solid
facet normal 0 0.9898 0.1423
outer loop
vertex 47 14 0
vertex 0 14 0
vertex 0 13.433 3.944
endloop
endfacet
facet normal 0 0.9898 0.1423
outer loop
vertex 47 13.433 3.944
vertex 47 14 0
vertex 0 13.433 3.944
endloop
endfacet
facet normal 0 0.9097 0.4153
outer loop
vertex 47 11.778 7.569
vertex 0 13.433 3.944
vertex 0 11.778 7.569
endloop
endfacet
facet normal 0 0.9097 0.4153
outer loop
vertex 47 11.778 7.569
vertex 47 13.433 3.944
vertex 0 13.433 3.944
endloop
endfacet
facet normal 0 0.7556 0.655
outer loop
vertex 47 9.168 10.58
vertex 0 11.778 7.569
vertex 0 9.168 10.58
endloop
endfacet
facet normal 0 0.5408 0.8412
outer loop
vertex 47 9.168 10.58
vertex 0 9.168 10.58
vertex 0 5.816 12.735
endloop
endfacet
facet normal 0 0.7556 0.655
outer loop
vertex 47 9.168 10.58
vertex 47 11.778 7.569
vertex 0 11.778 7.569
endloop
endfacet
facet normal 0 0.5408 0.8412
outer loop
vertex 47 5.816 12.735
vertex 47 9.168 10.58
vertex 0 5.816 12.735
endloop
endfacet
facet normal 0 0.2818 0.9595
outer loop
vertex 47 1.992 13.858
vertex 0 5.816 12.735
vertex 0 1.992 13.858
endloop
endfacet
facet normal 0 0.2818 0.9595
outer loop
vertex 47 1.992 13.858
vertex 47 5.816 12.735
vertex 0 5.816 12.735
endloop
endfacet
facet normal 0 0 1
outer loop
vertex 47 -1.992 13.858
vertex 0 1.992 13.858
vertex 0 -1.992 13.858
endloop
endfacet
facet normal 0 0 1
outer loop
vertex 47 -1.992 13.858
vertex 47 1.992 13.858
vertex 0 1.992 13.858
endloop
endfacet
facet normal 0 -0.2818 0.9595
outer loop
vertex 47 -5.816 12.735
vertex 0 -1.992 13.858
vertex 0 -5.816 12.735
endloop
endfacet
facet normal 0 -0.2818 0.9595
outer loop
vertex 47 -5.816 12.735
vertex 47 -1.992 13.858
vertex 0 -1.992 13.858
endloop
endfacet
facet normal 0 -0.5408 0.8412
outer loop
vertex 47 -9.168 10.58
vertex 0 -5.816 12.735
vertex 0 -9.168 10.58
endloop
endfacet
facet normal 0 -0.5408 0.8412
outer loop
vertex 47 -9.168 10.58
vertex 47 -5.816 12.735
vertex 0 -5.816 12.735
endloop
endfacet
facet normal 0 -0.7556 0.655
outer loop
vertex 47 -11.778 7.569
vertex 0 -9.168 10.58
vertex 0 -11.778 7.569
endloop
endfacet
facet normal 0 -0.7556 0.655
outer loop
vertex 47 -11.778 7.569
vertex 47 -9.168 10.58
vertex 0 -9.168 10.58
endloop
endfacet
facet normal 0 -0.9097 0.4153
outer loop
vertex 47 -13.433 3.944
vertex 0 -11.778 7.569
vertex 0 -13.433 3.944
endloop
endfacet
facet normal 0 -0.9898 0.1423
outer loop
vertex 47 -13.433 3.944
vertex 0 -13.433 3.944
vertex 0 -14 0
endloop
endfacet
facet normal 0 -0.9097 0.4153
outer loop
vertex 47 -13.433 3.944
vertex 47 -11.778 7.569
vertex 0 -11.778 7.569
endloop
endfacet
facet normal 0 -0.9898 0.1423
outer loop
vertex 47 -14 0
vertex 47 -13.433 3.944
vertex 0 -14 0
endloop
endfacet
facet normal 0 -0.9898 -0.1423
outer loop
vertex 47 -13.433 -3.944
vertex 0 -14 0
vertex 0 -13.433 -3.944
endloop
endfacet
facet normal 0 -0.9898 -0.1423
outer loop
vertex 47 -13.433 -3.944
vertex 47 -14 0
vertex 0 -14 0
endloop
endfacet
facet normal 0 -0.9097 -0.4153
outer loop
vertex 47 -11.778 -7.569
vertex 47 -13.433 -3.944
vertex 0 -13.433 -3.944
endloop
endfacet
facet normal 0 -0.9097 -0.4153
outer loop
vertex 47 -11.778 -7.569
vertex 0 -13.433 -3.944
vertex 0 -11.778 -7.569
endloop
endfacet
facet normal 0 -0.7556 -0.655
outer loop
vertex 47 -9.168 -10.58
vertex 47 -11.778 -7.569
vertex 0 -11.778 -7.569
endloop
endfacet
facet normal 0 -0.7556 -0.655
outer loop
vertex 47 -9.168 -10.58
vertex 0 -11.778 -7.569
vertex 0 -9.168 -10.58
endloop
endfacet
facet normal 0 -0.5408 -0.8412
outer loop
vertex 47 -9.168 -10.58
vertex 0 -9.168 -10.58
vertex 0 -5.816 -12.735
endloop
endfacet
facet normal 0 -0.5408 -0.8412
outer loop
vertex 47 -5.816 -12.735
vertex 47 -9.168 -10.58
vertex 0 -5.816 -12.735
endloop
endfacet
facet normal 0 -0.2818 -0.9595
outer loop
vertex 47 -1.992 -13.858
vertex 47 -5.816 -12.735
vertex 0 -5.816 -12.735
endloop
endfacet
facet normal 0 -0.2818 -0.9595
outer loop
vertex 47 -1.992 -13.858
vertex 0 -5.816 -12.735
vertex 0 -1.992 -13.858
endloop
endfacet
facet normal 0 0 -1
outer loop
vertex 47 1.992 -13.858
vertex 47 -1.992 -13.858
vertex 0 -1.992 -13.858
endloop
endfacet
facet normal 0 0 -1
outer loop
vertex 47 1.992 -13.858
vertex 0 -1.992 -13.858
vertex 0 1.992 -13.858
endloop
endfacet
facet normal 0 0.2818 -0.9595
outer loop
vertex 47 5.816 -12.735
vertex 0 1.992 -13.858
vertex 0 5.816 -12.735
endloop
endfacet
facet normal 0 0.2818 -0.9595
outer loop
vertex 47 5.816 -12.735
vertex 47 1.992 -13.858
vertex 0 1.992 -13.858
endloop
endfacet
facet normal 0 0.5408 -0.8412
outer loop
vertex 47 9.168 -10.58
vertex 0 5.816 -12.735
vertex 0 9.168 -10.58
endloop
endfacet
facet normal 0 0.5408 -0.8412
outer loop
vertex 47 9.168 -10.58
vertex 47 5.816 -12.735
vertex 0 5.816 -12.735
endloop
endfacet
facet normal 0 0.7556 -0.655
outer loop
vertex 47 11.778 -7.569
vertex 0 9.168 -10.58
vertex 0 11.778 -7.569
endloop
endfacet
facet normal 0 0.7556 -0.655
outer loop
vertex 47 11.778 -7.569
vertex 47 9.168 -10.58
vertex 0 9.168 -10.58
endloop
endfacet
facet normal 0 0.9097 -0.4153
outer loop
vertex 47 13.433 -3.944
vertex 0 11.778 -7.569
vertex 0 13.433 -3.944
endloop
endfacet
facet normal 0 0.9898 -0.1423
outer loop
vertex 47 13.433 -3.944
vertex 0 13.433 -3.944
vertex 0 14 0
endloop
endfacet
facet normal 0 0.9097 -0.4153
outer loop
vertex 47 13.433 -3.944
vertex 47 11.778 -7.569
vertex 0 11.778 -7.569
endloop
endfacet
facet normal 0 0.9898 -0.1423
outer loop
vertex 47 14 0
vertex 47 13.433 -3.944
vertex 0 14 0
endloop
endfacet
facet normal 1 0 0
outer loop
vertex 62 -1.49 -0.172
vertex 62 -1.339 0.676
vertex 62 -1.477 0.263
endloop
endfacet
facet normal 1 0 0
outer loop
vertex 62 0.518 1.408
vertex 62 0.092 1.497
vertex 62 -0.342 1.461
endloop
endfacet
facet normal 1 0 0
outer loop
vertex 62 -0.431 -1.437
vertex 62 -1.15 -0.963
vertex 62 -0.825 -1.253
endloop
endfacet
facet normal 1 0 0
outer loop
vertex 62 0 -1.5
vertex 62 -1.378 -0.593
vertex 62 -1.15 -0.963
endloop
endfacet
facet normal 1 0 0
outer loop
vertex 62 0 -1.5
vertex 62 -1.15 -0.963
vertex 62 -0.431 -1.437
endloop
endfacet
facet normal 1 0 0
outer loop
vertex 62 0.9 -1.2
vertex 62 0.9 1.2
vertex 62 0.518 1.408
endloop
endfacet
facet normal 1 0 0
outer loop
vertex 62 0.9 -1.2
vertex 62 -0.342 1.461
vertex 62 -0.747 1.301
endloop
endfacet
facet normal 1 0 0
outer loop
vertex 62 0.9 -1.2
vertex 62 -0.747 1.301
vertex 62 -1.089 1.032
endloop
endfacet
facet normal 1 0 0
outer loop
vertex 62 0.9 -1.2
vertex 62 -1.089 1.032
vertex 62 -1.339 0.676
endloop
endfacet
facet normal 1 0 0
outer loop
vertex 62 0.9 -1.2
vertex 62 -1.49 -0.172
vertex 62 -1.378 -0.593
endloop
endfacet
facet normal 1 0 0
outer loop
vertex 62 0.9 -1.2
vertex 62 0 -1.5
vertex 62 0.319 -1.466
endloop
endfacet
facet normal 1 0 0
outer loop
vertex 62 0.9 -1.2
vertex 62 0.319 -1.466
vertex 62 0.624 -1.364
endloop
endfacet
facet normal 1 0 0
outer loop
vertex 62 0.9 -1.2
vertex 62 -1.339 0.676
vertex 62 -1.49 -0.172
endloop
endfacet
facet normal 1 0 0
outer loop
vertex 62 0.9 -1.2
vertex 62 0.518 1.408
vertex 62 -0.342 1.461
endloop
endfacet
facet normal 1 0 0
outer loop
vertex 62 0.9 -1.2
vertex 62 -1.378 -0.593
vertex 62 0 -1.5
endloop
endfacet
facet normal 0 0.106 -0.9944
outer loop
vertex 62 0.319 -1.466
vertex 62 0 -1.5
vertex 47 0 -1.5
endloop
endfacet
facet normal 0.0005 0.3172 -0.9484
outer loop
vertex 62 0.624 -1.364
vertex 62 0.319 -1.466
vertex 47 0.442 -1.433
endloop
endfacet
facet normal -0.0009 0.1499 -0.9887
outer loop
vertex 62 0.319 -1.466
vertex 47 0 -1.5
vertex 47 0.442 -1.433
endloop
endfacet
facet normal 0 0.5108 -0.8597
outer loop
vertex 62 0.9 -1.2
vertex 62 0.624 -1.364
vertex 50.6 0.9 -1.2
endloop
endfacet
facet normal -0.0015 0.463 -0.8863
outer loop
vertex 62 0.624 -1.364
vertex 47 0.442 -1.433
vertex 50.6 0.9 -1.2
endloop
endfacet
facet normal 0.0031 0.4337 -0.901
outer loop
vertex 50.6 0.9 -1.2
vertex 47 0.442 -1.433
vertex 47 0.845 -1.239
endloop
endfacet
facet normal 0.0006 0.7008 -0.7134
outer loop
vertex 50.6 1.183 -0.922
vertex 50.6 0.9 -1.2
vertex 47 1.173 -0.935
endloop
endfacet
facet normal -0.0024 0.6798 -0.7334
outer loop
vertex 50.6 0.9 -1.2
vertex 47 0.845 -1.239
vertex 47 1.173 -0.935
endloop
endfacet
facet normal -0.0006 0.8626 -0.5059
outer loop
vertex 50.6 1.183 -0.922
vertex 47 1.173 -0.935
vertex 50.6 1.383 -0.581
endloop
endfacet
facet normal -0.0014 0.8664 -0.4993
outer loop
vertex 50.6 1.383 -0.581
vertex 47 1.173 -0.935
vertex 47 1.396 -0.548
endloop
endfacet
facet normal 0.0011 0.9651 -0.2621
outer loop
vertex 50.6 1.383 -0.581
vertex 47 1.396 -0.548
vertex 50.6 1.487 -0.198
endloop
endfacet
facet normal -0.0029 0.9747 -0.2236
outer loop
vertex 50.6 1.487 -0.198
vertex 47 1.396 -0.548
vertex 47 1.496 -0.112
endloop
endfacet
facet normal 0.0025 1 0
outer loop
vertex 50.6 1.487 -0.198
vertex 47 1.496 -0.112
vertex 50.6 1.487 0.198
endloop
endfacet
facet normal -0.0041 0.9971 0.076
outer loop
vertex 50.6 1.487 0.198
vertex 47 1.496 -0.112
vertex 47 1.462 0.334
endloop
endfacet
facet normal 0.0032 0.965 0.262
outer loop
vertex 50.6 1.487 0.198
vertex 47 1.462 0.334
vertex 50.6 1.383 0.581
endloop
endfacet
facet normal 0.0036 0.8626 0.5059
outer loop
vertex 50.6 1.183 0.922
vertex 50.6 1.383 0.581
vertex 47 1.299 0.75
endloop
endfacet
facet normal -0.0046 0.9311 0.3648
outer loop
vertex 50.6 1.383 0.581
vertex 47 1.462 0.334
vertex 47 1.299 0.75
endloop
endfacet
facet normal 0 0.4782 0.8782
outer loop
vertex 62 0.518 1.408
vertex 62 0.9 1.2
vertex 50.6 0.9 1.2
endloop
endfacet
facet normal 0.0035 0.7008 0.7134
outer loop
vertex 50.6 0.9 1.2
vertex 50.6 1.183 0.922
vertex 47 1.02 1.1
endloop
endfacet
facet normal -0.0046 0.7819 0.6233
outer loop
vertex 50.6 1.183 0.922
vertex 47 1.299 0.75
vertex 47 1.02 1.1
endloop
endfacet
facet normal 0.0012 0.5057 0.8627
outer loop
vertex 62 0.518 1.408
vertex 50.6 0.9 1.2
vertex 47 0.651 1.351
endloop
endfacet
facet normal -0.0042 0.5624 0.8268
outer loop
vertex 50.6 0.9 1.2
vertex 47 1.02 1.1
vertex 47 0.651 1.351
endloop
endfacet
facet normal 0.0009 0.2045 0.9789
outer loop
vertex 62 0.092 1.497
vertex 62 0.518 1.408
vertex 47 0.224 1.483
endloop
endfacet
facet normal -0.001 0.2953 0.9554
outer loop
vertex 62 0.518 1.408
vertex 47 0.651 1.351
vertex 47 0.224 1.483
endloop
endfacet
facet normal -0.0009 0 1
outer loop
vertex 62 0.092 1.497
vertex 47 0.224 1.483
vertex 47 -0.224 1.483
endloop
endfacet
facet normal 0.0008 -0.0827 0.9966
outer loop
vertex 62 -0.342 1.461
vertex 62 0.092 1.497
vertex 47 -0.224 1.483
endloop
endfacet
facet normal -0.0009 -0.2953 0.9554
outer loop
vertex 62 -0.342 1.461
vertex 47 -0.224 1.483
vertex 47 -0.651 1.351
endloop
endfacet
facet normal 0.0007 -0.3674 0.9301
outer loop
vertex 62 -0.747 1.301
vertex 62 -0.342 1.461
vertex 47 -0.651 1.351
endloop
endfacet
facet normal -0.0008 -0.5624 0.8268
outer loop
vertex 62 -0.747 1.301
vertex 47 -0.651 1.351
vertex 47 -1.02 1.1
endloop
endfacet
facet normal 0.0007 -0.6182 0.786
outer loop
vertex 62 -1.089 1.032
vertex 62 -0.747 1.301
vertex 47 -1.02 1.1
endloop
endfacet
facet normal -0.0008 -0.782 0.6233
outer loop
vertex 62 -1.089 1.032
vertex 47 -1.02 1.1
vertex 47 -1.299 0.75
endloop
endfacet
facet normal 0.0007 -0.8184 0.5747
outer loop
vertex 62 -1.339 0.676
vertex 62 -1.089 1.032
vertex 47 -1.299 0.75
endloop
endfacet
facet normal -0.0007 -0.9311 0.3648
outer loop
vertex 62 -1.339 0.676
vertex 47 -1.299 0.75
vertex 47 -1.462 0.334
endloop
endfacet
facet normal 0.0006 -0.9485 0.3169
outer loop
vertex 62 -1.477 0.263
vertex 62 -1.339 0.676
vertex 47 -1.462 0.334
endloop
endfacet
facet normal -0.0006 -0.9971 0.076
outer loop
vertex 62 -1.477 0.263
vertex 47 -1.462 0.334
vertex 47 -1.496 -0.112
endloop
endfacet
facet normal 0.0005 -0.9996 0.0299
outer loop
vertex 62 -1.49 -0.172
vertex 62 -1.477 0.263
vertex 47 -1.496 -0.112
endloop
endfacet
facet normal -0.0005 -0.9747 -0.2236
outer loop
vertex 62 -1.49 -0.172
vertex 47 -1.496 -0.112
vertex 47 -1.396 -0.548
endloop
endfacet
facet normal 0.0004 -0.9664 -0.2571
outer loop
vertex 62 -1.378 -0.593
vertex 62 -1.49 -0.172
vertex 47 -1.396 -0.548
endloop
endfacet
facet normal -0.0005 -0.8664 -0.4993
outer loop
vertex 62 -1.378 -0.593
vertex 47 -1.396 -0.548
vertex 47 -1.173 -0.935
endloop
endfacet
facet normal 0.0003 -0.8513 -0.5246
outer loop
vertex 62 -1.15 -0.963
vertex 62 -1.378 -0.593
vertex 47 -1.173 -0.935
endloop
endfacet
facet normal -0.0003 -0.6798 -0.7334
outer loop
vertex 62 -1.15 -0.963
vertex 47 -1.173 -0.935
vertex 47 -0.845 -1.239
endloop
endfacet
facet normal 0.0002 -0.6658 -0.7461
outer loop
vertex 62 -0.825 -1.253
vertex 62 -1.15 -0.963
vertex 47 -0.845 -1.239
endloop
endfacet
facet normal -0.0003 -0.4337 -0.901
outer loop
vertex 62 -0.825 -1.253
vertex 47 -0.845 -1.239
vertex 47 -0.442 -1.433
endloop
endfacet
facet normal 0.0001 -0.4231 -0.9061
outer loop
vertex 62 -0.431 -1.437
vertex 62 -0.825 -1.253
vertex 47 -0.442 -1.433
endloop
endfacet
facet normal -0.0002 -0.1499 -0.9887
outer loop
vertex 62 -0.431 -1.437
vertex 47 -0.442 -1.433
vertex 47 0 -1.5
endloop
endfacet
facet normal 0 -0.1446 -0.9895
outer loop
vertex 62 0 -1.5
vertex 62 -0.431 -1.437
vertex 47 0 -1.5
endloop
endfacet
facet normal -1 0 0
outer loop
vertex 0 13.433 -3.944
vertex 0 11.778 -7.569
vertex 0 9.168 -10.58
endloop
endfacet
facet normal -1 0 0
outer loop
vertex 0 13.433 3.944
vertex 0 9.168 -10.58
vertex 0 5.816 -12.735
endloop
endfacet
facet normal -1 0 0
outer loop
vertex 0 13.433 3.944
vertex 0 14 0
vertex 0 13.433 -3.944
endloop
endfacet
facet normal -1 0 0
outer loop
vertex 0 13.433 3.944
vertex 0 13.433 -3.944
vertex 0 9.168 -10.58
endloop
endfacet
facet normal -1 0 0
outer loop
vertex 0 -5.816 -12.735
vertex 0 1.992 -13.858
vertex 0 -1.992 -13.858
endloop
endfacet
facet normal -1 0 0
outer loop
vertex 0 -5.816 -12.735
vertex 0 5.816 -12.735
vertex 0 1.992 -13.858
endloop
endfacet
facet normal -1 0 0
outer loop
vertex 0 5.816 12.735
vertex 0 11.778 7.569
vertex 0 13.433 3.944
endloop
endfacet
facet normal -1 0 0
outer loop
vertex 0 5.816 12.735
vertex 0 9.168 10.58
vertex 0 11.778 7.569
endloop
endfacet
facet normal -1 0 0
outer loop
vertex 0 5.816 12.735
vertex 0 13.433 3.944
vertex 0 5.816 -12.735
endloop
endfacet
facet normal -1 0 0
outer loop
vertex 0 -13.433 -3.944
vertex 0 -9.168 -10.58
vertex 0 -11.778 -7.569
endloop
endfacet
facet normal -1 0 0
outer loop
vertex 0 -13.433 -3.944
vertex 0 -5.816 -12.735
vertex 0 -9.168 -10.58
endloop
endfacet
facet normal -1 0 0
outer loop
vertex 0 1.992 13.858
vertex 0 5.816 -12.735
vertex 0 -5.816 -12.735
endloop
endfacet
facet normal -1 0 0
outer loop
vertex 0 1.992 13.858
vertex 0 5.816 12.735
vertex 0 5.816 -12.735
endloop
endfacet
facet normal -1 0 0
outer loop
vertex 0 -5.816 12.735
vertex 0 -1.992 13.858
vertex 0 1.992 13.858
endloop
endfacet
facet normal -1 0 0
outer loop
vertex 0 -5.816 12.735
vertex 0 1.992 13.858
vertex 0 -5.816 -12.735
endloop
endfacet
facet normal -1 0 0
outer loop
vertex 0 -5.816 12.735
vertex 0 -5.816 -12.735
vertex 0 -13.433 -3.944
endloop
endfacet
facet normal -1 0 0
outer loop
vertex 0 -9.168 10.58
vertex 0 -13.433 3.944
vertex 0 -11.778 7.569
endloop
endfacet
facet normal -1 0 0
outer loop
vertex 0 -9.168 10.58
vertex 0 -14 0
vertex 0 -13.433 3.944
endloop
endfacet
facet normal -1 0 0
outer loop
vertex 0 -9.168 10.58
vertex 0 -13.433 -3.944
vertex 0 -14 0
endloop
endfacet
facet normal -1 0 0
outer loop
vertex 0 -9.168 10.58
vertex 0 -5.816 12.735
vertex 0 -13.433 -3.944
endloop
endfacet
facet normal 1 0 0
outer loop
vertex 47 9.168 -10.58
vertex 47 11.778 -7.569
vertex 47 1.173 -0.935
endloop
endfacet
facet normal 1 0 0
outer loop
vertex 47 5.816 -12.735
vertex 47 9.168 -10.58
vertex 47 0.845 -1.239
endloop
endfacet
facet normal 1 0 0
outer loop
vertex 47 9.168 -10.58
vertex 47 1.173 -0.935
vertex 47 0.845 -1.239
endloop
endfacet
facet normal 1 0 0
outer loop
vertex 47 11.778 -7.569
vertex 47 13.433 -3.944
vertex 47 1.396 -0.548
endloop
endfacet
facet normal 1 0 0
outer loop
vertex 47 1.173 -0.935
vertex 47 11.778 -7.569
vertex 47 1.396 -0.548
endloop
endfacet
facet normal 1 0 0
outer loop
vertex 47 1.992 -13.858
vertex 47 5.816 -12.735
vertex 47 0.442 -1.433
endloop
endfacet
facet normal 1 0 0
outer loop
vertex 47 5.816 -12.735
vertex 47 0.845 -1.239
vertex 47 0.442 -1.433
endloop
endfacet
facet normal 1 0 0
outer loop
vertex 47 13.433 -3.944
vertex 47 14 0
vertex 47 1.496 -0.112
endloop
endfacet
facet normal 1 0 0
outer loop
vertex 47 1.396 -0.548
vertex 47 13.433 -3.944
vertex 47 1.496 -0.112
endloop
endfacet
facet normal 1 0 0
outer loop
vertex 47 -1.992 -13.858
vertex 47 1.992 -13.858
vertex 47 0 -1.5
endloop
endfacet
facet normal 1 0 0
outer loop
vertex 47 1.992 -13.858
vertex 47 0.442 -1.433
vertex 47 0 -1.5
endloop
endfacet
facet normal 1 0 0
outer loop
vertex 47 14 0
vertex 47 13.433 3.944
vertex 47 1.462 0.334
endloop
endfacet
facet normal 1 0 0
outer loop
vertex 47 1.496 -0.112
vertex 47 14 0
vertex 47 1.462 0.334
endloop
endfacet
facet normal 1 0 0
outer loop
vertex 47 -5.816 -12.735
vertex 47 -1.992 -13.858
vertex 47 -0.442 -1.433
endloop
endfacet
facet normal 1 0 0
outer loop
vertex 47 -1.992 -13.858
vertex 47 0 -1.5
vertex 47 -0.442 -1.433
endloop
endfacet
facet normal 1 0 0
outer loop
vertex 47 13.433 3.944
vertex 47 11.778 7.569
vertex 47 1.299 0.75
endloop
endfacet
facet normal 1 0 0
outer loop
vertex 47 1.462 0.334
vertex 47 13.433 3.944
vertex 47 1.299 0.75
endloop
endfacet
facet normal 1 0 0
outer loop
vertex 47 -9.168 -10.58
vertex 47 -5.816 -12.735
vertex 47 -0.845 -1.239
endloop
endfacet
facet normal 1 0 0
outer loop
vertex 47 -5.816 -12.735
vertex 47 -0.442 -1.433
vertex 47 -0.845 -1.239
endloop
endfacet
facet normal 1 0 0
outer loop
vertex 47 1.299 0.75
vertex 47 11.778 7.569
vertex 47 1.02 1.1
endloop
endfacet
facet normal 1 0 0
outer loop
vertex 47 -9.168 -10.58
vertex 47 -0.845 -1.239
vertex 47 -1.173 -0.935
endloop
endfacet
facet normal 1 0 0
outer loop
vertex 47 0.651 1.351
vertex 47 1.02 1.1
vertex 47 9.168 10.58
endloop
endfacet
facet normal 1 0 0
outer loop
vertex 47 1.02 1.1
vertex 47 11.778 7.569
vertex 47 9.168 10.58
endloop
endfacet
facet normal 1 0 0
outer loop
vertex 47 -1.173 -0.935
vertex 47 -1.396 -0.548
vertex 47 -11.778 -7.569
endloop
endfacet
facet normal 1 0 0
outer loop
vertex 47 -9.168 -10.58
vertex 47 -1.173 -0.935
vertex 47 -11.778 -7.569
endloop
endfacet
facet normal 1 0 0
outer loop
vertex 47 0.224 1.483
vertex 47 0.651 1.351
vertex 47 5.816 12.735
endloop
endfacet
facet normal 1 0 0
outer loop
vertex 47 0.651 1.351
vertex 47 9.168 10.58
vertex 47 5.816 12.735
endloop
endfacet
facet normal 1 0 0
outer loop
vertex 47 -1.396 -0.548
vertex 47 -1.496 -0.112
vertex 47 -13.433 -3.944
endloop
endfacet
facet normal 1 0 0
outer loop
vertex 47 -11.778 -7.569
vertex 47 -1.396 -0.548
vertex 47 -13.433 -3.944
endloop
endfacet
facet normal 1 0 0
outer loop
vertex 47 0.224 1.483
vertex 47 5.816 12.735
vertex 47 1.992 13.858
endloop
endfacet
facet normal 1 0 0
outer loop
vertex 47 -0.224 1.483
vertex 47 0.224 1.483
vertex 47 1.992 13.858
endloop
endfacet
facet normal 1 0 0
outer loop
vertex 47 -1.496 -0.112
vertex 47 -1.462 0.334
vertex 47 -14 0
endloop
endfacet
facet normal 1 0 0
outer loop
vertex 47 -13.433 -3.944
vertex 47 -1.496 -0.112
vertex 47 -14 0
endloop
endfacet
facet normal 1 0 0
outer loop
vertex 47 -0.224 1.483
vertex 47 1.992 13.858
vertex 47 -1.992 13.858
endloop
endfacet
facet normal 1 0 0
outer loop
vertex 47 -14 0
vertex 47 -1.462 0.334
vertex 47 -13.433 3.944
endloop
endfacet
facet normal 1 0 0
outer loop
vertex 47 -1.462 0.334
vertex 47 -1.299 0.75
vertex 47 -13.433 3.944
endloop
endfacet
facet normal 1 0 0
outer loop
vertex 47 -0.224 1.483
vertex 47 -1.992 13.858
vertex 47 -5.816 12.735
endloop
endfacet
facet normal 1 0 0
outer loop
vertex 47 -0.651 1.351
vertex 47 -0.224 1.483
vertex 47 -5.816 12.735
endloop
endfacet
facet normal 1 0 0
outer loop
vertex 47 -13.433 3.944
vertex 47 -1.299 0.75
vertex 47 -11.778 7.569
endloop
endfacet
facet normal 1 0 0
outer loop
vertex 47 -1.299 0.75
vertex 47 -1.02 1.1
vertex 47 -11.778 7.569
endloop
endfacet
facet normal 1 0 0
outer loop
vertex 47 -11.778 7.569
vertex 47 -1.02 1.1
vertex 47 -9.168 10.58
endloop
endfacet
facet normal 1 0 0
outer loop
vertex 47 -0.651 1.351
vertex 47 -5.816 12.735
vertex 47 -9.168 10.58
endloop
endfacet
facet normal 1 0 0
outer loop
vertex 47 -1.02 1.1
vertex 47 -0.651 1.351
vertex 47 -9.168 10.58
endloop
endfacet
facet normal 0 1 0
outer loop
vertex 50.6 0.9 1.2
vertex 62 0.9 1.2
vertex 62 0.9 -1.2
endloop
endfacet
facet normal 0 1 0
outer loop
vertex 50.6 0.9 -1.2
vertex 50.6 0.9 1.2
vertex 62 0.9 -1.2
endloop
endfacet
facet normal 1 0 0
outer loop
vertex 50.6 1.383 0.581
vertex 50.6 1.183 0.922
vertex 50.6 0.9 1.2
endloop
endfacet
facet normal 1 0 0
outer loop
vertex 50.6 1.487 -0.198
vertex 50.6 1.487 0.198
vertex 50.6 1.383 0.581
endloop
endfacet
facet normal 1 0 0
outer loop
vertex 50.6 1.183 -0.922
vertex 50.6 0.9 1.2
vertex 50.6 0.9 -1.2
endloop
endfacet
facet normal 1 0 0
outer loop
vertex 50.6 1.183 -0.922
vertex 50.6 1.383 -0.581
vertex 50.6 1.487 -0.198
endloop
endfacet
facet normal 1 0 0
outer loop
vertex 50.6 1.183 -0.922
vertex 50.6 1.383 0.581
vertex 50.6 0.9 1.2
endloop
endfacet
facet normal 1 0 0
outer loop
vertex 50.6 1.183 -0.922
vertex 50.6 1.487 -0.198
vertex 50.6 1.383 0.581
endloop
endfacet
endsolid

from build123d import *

# Parameters (mm, degrees)
SKETCH1_W           = 47
SKETCH1_H           = 14
SKETCH2_R           = 1.5
BOSS_EXTRUDE1_DEPTH = 15
CUT_EXTRUDE1_DEPTH  = 11.4


with BuildPart() as part:
    # Sketch1 → Revolve1 (revolve)
    with BuildSketch(Plane.XY):
        with Locations((23.5, 7)):
            Rectangle(SKETCH1_W, SKETCH1_H)
    revolve(axis=Axis((0, 0, 0), (1, 0, 0)))

    # Sketch2 → Boss-Extrude1 (add)
    with BuildSketch(Plane(origin=(47, 0, 0), x_dir=(0, 0, -1), z_dir=(1, 0, 0))):
        Circle(SKETCH2_R)
    extrude(amount=BOSS_EXTRUDE1_DEPTH)

    # Sketch3 → Cut-Extrude1 (cut)
    with BuildSketch(Plane(origin=(62, 0, 0), x_dir=(0, 0, -1), z_dir=(1, 0, 0))):
        with BuildLine():
            Line((-1.2, 0.9), (1.2, 0.9))
            ThreePointArc((1.2, 0.9), (0, 1.5), (-1.2, 0.9))
        make_face()
    extrude(amount=-CUT_EXTRUDE1_DEPTH, mode=Mode.SUBTRACT)


solid = part.part
